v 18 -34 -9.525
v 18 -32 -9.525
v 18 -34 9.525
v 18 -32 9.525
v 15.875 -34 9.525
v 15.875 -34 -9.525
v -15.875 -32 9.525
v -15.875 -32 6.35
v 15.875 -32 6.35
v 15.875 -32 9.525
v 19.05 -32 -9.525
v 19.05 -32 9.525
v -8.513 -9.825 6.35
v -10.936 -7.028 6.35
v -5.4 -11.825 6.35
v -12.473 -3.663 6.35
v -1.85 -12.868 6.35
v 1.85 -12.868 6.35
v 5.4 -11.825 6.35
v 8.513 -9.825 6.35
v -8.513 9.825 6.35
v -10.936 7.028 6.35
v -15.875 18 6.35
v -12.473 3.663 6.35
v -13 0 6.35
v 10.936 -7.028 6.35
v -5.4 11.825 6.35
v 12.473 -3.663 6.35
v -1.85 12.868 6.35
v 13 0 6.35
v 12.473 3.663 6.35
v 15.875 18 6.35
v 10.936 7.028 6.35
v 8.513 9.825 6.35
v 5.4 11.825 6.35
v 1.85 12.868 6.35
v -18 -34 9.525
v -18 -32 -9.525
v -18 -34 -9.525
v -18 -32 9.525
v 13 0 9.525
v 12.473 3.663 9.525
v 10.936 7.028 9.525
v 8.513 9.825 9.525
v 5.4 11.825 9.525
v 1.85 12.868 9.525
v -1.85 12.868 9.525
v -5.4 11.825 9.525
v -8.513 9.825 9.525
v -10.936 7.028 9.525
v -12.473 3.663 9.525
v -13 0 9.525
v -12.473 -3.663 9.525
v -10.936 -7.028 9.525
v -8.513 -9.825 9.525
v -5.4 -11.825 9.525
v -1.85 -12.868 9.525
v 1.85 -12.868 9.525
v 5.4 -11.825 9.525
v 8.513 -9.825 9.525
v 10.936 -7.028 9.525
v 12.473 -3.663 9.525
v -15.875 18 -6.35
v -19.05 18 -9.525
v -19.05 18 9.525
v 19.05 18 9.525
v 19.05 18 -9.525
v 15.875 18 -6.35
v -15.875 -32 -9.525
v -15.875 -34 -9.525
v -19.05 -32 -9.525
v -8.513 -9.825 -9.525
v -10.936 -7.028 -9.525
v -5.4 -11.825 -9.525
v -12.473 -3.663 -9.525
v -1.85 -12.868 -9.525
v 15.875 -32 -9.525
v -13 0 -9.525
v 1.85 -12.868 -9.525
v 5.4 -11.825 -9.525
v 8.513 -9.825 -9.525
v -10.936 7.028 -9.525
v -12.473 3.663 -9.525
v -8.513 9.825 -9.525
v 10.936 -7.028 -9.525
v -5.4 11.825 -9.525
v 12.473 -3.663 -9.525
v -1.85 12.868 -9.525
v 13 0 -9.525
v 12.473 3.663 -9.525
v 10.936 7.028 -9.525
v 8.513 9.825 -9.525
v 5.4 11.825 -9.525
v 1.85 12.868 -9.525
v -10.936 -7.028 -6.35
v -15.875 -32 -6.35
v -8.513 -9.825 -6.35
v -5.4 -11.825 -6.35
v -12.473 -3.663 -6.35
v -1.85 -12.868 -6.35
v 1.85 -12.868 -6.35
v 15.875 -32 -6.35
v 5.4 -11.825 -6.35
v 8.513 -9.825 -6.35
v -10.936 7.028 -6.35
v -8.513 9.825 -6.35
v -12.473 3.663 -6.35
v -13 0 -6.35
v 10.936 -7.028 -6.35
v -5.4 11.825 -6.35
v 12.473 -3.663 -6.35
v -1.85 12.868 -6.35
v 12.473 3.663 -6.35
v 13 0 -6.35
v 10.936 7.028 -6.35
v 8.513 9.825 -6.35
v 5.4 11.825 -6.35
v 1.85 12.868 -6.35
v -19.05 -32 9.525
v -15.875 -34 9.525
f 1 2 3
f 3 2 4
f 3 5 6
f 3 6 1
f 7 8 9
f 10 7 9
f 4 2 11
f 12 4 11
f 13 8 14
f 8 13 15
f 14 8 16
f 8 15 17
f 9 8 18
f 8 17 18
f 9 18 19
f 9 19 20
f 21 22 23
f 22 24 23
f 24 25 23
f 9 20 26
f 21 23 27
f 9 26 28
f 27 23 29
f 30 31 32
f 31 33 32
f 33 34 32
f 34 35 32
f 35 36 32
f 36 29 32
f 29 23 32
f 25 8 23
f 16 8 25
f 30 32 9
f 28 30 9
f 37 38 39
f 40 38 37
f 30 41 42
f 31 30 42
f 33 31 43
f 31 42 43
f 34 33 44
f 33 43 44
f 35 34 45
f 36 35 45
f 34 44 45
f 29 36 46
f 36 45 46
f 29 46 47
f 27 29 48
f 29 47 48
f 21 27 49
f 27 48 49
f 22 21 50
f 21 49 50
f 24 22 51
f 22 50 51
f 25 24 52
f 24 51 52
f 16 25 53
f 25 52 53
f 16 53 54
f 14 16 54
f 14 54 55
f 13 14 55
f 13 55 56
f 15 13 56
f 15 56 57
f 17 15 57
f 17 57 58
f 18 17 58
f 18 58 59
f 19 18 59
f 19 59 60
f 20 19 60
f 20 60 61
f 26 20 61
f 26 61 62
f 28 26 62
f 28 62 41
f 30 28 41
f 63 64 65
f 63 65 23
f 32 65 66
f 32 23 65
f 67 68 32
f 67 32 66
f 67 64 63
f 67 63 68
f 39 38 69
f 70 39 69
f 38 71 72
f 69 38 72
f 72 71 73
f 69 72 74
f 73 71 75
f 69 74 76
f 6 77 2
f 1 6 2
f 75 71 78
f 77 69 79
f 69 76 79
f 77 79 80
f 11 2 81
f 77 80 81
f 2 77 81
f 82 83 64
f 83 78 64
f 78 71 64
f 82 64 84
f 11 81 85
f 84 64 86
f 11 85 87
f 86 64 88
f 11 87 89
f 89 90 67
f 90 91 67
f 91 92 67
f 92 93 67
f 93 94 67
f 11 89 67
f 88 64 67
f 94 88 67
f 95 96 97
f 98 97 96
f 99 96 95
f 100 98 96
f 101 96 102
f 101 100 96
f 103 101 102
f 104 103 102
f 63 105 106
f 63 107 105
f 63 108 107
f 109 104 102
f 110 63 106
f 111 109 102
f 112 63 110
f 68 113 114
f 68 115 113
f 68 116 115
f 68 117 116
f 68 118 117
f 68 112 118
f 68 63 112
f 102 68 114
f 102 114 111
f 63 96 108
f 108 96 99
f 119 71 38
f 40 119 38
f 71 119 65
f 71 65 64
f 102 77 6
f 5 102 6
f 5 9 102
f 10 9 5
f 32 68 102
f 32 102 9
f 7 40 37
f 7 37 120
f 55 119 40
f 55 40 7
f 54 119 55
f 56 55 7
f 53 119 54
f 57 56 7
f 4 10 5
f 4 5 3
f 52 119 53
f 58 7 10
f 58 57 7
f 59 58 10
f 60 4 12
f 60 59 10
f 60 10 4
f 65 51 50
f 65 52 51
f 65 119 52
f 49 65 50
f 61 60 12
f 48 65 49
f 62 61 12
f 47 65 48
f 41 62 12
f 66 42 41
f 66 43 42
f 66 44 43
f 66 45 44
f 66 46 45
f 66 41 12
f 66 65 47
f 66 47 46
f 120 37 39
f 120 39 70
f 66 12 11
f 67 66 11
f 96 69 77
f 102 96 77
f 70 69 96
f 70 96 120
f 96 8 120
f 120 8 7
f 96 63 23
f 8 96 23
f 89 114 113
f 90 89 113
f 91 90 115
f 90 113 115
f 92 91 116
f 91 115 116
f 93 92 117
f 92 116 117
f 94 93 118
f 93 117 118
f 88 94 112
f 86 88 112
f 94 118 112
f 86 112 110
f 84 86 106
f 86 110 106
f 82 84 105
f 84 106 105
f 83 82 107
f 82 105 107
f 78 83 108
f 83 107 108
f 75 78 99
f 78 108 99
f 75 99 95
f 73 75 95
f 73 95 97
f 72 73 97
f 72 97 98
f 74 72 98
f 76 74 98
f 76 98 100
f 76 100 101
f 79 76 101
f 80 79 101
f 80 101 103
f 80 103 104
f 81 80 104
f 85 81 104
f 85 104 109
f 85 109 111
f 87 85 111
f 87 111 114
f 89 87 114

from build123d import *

# Parameters (mm, degrees)
SKETCH2_W                = 38.1
SKETCH2_H                = 19.05
SKETCH2_W_2              = 31.75
SKETCH2_H_2              = 12.7
BOSS_EXTRUDE1_DEPTH      = 18
BOSS_EXTRUDE1_DEPTH_BACK = 32
SKETCH3_R                = 13
CUT_EXTRUDE1_DEPTH       = 20.05
SKETCH5_W                = 2.125
SKETCH5_H                = 19.05
BOSS_EXTRUDE2_DEPTH      = 2


with BuildPart() as part:
    # Sketch2 → Boss-Extrude1 (new body, two sides)
    with BuildSketch(Plane(origin=(0, 0, 0), x_dir=(1, 0, 0), z_dir=(0, 1, 0))) as boss_extrude1_sk:
        Rectangle(SKETCH2_W, SKETCH2_H)
        Rectangle(SKETCH2_W_2, SKETCH2_H_2, mode=Mode.SUBTRACT)
    extrude(amount=BOSS_EXTRUDE1_DEPTH)
    extrude(boss_extrude1_sk.sketch, amount=-BOSS_EXTRUDE1_DEPTH_BACK)

    # Sketch3 → Cut-Extrude1 (cut, through all)
    with BuildSketch(Plane.XY.offset(9.525)):
        Circle(SKETCH3_R)
    extrude(amount=-CUT_EXTRUDE1_DEPTH, mode=Mode.SUBTRACT)

    # Sketch5 → Boss-Extrude2 (add)
    with BuildSketch(Plane.XZ.offset(32)):
        with Locations((-16.9375, 0)):
            Rectangle(SKETCH5_W, SKETCH5_H)
        with Locations((16.9375, 0)):
            Rectangle(SKETCH5_W, SKETCH5_H)
    extrude(amount=BOSS_EXTRUDE2_DEPTH)


solid = part.part
